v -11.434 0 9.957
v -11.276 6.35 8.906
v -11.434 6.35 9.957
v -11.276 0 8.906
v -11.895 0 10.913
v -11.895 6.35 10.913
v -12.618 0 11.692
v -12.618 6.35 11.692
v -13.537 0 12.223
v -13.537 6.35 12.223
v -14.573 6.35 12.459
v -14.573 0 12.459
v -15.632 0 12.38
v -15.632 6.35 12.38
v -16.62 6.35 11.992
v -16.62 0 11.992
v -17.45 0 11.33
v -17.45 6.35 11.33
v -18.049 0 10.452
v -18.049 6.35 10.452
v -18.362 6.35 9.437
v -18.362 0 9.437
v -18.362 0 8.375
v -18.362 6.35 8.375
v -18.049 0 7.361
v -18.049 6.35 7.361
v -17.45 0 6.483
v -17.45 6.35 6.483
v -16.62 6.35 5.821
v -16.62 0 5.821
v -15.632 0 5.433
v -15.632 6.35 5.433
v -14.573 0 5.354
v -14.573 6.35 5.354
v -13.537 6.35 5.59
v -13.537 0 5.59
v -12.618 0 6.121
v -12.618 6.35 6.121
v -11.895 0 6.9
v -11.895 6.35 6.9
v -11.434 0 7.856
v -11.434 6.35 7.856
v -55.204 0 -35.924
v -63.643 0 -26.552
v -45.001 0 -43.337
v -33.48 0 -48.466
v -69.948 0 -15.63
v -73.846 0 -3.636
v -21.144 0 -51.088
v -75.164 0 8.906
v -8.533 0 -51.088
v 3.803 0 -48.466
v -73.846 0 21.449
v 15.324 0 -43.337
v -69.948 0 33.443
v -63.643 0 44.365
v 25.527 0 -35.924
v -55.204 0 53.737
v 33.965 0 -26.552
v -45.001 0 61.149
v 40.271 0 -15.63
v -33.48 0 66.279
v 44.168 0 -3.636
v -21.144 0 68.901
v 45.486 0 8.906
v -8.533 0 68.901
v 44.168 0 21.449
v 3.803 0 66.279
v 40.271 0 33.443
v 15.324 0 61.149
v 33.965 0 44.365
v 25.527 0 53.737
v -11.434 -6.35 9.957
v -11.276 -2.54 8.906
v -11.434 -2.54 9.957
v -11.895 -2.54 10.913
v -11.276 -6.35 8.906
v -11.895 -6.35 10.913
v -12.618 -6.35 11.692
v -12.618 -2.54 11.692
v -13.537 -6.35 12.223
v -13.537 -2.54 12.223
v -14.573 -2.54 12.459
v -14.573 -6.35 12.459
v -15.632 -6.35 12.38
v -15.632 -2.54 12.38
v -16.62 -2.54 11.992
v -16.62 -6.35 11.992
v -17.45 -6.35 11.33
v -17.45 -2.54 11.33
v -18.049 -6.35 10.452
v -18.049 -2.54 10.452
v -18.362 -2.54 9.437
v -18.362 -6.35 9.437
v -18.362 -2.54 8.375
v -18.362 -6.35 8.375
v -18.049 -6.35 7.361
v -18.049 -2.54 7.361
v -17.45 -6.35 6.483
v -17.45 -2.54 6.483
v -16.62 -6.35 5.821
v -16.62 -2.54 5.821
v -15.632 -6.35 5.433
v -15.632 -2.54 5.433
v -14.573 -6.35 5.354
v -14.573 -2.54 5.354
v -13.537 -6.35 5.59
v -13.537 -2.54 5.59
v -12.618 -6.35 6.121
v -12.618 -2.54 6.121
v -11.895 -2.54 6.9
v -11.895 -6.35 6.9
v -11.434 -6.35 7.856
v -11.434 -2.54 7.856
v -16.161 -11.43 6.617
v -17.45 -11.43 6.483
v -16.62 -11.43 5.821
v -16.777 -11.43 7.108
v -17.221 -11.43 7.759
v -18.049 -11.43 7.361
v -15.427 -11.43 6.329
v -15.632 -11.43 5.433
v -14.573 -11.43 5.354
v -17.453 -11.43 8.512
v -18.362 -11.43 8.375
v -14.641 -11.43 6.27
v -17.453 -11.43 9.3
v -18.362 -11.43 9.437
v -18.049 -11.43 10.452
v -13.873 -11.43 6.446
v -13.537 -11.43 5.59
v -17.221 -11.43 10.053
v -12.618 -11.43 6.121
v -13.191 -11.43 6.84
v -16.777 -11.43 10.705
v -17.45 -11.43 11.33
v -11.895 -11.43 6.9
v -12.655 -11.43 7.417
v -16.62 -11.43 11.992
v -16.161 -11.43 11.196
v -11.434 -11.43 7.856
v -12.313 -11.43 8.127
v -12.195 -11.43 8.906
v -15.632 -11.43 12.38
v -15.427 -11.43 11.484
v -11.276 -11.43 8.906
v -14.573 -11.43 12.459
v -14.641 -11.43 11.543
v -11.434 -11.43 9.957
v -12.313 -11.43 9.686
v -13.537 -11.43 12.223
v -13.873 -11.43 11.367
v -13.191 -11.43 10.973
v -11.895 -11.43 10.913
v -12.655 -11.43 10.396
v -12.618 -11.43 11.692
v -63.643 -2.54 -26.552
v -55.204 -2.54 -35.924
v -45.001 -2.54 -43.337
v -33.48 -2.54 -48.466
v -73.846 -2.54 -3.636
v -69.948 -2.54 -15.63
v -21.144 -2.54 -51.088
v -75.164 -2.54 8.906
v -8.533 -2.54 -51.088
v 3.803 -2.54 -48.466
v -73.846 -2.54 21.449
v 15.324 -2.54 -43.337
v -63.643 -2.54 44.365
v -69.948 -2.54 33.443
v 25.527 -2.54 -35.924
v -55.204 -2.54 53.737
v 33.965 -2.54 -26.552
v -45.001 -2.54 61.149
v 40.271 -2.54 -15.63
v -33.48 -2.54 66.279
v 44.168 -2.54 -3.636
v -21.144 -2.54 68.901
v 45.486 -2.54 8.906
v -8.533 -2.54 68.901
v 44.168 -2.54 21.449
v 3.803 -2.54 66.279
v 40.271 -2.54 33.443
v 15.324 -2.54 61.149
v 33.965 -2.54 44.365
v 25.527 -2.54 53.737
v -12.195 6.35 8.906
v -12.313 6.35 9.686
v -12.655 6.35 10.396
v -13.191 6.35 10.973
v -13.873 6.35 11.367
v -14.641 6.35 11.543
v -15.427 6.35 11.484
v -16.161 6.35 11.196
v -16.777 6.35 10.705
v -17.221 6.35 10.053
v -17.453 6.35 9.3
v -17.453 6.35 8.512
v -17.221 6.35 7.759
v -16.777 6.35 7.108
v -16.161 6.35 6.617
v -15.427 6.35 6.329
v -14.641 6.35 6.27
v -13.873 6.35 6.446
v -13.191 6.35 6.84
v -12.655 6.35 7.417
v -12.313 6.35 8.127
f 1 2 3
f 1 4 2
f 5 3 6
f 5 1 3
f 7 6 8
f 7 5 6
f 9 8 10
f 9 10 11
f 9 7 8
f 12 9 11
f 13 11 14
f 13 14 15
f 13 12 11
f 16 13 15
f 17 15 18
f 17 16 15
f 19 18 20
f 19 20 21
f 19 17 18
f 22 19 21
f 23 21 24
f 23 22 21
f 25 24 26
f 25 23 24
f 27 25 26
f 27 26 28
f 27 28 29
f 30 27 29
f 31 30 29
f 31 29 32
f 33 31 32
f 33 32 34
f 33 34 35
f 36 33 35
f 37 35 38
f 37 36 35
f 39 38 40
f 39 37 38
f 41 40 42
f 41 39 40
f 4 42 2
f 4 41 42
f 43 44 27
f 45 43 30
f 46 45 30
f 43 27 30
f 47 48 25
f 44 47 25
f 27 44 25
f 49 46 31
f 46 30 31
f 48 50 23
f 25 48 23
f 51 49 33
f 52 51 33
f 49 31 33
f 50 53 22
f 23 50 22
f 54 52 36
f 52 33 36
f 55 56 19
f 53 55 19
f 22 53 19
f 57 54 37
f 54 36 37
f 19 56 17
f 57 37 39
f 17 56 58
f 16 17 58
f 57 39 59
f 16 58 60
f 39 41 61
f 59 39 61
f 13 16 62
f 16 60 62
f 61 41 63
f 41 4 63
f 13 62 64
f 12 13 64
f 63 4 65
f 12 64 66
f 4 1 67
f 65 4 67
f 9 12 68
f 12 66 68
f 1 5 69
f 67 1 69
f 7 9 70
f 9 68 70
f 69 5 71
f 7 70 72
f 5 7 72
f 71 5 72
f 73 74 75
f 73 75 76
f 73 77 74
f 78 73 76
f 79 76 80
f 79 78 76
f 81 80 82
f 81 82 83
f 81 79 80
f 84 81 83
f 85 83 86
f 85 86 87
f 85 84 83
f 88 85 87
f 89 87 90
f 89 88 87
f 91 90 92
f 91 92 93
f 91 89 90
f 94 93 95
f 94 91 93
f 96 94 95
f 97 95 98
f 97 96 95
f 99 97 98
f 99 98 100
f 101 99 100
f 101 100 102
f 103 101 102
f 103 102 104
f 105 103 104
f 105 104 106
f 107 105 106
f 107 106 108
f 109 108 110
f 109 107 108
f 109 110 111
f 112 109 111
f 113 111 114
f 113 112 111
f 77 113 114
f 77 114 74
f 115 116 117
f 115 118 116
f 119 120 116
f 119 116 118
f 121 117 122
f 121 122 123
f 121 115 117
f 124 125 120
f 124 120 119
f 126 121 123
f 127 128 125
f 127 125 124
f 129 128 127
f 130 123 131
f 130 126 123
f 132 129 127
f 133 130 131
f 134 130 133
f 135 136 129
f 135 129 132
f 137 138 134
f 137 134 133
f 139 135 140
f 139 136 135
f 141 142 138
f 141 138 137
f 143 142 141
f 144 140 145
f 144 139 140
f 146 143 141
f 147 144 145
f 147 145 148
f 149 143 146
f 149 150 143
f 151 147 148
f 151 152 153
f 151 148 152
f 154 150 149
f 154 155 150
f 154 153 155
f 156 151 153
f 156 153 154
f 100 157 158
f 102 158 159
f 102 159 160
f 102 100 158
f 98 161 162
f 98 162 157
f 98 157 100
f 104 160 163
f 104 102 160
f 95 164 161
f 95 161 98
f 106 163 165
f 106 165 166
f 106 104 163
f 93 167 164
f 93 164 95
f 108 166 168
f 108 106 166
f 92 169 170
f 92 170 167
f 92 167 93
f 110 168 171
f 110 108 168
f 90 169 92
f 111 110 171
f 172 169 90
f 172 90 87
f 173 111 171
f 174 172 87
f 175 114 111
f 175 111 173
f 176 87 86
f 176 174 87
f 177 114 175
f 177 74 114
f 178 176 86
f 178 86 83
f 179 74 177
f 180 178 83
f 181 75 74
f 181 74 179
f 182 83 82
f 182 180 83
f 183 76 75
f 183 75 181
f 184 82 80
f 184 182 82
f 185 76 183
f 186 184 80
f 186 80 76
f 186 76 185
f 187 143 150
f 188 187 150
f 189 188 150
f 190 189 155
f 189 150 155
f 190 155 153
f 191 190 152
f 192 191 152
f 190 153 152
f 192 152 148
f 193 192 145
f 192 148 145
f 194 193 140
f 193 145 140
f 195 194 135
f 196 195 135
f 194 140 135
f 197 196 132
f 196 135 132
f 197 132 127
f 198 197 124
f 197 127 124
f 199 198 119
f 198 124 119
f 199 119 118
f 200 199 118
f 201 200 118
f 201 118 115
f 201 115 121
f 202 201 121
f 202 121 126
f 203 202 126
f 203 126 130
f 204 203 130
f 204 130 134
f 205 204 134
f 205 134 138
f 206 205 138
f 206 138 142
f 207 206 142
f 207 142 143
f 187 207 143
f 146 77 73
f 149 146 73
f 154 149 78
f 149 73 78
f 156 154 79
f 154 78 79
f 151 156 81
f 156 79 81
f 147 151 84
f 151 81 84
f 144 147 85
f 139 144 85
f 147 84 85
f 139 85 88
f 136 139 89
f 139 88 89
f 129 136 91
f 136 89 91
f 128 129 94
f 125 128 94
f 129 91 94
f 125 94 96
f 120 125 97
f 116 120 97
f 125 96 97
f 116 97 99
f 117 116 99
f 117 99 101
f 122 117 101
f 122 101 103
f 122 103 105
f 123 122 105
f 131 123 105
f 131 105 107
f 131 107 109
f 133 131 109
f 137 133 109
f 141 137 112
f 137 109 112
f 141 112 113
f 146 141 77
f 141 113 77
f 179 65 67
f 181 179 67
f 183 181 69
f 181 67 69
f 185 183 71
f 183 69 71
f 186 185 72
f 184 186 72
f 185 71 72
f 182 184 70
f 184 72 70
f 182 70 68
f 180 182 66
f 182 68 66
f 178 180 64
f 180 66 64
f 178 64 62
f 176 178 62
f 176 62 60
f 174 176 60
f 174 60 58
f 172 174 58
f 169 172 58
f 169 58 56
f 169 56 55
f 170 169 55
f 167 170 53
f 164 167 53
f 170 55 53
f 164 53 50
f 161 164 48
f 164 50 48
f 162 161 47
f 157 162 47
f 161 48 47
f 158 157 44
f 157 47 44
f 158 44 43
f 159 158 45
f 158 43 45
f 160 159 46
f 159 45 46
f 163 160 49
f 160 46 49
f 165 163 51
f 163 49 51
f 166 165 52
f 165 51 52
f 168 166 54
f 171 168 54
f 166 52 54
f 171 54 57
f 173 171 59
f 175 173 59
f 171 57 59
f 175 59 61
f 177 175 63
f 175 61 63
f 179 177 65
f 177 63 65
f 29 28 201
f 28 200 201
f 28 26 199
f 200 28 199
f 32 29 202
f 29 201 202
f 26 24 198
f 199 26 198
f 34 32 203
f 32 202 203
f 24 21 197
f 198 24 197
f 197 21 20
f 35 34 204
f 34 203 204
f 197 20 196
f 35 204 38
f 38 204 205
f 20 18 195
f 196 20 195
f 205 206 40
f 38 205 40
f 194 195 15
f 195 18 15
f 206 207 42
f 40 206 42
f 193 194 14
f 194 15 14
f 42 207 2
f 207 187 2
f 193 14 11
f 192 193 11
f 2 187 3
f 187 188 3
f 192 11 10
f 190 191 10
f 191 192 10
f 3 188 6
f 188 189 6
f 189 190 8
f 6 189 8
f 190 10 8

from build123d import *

# Parameters (mm, degrees)
F0_R     = 60.325
F1_DEPTH = 2.54
F2_R     = 3.5626601451
F3_DEPTH = 3.81
F4_DEPTH = 5.08
F5_DEPTH = 5.08
F6_R     = 2.6436042206
F7_DEPTH = 17.781


with BuildPart() as f1:
    # F0 (on Front) → F1 (new body)
    with BuildSketch(Plane.XZ):
        with Locations((-14.8387914523, 8.9064473286)):
            Circle(F0_R)
    extrude(amount=F1_DEPTH)

    # F2 (on face) → F3 (join, symmetric)
    with BuildSketch(Plane.XZ.offset(2.54)):
        with Locations((-14.8387914523, 8.9064473286)):
            Circle(F2_R)
    extrude(amount=F3_DEPTH, both=True)

    # F4 (add): a face of the model
    f4_faces = [f1.faces().sort_by_distance(p)[0] for p in [
        (-14.8387914523, 1.27, 8.9064473286),
    ]]
    extrude(f4_faces, amount=F4_DEPTH)

    # F5 (add): a face of the model
    f5_faces = [f1.faces().sort_by_distance(p)[0] for p in [
        (-14.8387914523, -6.35, 8.9064473286),
    ]]
    extrude(f5_faces, amount=F5_DEPTH)

    # F6 (on face) → F7 (cut, through all)
    with BuildSketch(Plane.XZ.offset(11.43)):
        with Locations((-14.8387914523, 8.9064473286)):
            Circle(F6_R)
    extrude(amount=-F7_DEPTH, mode=Mode.SUBTRACT)


solid = f1.part
